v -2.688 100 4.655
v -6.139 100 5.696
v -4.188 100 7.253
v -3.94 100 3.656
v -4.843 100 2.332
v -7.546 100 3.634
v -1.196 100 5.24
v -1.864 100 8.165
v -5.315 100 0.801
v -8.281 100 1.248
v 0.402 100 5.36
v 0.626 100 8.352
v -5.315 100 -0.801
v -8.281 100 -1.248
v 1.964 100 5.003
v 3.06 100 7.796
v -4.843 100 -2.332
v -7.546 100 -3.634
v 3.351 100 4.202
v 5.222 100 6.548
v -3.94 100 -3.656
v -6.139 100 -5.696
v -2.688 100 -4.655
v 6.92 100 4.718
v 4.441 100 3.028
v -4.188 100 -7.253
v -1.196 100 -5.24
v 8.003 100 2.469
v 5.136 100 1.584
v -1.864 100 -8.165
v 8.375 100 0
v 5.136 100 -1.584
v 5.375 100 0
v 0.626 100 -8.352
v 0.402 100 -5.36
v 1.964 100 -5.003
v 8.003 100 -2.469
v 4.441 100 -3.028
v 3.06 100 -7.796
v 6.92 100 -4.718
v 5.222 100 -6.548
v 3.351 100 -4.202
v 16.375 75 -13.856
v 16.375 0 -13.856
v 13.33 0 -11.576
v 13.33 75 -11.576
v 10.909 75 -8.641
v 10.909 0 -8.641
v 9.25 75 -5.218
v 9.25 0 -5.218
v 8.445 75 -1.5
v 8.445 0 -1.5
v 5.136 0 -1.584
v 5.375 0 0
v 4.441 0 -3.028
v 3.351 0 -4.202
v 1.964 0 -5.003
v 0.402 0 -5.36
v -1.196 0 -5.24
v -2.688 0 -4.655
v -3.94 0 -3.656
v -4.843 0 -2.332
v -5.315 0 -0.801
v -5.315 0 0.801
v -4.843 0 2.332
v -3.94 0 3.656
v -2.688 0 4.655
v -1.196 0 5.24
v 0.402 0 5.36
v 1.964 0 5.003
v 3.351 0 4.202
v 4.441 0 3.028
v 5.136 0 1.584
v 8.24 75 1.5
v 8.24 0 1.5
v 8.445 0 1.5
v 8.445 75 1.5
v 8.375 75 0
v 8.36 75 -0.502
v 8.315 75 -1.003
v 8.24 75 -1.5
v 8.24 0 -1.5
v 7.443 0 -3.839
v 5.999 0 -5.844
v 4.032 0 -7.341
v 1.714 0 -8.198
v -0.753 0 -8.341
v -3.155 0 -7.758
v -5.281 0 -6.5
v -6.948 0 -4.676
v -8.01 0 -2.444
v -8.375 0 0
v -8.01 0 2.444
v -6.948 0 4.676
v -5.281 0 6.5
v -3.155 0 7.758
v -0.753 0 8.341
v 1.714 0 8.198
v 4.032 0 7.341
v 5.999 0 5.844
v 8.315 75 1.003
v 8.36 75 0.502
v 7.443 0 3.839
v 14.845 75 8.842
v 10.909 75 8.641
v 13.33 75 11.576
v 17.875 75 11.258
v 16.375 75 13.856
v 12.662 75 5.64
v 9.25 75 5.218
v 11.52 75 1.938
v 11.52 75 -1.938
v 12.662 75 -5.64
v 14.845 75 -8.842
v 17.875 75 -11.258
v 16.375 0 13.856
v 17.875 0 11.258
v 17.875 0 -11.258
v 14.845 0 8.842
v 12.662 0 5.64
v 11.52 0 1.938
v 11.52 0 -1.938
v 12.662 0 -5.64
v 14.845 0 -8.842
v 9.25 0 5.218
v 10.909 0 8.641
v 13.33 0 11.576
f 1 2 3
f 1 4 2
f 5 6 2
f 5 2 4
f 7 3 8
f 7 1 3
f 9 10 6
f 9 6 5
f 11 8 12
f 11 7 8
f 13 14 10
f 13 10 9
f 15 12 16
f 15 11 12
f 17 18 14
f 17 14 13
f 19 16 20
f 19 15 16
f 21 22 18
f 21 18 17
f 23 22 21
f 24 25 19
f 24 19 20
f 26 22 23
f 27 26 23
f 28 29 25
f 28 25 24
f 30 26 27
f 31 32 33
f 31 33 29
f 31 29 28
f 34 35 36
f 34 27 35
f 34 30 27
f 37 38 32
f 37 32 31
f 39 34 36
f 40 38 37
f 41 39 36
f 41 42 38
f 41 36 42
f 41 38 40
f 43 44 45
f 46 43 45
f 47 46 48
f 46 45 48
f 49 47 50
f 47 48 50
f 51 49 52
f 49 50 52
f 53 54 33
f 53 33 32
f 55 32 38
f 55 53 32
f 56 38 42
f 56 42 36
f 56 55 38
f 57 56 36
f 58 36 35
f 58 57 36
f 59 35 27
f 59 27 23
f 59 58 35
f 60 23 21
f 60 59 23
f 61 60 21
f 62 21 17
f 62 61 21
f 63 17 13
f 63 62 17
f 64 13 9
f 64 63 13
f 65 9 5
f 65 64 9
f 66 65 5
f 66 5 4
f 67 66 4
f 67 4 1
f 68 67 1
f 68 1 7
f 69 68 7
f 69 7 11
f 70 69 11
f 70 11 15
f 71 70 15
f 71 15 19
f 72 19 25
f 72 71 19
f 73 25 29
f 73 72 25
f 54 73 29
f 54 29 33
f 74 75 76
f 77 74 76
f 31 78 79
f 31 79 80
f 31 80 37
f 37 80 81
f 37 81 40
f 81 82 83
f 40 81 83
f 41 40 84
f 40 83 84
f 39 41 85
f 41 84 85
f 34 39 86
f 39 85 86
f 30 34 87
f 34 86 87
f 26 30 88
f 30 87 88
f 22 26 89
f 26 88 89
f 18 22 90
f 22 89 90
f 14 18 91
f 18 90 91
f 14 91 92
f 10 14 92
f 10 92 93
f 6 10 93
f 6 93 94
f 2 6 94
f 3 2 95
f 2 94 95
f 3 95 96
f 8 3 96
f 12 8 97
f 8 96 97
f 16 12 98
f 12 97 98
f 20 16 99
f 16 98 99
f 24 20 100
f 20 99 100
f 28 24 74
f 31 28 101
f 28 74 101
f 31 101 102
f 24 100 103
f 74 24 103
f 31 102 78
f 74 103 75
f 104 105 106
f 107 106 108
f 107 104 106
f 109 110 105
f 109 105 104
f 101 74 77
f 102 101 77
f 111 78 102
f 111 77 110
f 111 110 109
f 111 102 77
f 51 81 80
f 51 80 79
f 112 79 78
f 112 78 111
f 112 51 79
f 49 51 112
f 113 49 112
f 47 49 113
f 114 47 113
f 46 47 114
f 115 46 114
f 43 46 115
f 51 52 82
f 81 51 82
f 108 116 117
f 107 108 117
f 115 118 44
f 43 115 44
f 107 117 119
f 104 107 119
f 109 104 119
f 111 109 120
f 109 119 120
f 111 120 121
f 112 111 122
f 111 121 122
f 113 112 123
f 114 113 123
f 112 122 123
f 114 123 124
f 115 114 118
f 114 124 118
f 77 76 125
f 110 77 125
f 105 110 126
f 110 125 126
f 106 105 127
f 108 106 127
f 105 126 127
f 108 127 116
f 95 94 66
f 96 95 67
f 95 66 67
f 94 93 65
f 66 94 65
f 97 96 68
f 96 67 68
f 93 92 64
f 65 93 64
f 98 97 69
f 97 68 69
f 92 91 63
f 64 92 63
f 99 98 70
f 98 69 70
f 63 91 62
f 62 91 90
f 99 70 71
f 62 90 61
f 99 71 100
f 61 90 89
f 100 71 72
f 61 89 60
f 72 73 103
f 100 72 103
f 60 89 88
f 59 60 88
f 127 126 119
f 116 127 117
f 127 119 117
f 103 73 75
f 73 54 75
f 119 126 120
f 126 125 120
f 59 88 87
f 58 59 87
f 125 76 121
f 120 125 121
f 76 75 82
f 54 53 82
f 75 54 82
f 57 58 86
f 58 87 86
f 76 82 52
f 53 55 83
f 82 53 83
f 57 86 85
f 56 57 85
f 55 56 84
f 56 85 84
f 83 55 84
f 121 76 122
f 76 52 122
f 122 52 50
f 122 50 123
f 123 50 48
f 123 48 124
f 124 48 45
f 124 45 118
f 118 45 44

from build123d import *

# Parameters (mm, degrees)
SKETCH1_R           = 8.375
SKETCH1_R_2         = 5.375
BOSS_EXTRUDE1_DEPTH = 100
BOSS_EXTRUDE2_DEPTH = 75


with BuildPart() as part:
    # Sketch1 → Boss-Extrude1 (new body)
    with BuildSketch(Plane(origin=(0, 0, 0), x_dir=(1, 0, 0), z_dir=(0, 1, 0))):
        Circle(SKETCH1_R)
        Circle(SKETCH1_R_2, mode=Mode.SUBTRACT)
    extrude(amount=BOSS_EXTRUDE1_DEPTH)

    # Sketch2 → Boss-Extrude2 (add)
    with BuildSketch(Plane(origin=(0, 0, 0), x_dir=(1, 0, 0), z_dir=(0, 1, 0))):
        with BuildLine():
            Line((8.445467678, 1.5), (8.239576749, 1.5))
            ThreePointArc((8.239576749, 1.5), (8.375, 0), (8.239576749, -1.5))
            Line((8.239576749, -1.5), (8.445467678, -1.5))
            ThreePointArc((8.445467678, -1.5), (10.909272228, -8.64142208), (16.375, -13.856406461))
            Line((16.375, -13.856406461), (17.875, -11.258330249))
            ThreePointArc((17.875, -11.258330249), (11.375, 0), (17.875, 11.258330249))
            Line((17.875, 11.258330249), (16.375, 13.856406461))
            ThreePointArc((16.375, 13.856406461), (10.909272228, 8.64142208), (8.445467678, 1.5))
        make_face()
    extrude(amount=BOSS_EXTRUDE2_DEPTH)


solid = part.part
